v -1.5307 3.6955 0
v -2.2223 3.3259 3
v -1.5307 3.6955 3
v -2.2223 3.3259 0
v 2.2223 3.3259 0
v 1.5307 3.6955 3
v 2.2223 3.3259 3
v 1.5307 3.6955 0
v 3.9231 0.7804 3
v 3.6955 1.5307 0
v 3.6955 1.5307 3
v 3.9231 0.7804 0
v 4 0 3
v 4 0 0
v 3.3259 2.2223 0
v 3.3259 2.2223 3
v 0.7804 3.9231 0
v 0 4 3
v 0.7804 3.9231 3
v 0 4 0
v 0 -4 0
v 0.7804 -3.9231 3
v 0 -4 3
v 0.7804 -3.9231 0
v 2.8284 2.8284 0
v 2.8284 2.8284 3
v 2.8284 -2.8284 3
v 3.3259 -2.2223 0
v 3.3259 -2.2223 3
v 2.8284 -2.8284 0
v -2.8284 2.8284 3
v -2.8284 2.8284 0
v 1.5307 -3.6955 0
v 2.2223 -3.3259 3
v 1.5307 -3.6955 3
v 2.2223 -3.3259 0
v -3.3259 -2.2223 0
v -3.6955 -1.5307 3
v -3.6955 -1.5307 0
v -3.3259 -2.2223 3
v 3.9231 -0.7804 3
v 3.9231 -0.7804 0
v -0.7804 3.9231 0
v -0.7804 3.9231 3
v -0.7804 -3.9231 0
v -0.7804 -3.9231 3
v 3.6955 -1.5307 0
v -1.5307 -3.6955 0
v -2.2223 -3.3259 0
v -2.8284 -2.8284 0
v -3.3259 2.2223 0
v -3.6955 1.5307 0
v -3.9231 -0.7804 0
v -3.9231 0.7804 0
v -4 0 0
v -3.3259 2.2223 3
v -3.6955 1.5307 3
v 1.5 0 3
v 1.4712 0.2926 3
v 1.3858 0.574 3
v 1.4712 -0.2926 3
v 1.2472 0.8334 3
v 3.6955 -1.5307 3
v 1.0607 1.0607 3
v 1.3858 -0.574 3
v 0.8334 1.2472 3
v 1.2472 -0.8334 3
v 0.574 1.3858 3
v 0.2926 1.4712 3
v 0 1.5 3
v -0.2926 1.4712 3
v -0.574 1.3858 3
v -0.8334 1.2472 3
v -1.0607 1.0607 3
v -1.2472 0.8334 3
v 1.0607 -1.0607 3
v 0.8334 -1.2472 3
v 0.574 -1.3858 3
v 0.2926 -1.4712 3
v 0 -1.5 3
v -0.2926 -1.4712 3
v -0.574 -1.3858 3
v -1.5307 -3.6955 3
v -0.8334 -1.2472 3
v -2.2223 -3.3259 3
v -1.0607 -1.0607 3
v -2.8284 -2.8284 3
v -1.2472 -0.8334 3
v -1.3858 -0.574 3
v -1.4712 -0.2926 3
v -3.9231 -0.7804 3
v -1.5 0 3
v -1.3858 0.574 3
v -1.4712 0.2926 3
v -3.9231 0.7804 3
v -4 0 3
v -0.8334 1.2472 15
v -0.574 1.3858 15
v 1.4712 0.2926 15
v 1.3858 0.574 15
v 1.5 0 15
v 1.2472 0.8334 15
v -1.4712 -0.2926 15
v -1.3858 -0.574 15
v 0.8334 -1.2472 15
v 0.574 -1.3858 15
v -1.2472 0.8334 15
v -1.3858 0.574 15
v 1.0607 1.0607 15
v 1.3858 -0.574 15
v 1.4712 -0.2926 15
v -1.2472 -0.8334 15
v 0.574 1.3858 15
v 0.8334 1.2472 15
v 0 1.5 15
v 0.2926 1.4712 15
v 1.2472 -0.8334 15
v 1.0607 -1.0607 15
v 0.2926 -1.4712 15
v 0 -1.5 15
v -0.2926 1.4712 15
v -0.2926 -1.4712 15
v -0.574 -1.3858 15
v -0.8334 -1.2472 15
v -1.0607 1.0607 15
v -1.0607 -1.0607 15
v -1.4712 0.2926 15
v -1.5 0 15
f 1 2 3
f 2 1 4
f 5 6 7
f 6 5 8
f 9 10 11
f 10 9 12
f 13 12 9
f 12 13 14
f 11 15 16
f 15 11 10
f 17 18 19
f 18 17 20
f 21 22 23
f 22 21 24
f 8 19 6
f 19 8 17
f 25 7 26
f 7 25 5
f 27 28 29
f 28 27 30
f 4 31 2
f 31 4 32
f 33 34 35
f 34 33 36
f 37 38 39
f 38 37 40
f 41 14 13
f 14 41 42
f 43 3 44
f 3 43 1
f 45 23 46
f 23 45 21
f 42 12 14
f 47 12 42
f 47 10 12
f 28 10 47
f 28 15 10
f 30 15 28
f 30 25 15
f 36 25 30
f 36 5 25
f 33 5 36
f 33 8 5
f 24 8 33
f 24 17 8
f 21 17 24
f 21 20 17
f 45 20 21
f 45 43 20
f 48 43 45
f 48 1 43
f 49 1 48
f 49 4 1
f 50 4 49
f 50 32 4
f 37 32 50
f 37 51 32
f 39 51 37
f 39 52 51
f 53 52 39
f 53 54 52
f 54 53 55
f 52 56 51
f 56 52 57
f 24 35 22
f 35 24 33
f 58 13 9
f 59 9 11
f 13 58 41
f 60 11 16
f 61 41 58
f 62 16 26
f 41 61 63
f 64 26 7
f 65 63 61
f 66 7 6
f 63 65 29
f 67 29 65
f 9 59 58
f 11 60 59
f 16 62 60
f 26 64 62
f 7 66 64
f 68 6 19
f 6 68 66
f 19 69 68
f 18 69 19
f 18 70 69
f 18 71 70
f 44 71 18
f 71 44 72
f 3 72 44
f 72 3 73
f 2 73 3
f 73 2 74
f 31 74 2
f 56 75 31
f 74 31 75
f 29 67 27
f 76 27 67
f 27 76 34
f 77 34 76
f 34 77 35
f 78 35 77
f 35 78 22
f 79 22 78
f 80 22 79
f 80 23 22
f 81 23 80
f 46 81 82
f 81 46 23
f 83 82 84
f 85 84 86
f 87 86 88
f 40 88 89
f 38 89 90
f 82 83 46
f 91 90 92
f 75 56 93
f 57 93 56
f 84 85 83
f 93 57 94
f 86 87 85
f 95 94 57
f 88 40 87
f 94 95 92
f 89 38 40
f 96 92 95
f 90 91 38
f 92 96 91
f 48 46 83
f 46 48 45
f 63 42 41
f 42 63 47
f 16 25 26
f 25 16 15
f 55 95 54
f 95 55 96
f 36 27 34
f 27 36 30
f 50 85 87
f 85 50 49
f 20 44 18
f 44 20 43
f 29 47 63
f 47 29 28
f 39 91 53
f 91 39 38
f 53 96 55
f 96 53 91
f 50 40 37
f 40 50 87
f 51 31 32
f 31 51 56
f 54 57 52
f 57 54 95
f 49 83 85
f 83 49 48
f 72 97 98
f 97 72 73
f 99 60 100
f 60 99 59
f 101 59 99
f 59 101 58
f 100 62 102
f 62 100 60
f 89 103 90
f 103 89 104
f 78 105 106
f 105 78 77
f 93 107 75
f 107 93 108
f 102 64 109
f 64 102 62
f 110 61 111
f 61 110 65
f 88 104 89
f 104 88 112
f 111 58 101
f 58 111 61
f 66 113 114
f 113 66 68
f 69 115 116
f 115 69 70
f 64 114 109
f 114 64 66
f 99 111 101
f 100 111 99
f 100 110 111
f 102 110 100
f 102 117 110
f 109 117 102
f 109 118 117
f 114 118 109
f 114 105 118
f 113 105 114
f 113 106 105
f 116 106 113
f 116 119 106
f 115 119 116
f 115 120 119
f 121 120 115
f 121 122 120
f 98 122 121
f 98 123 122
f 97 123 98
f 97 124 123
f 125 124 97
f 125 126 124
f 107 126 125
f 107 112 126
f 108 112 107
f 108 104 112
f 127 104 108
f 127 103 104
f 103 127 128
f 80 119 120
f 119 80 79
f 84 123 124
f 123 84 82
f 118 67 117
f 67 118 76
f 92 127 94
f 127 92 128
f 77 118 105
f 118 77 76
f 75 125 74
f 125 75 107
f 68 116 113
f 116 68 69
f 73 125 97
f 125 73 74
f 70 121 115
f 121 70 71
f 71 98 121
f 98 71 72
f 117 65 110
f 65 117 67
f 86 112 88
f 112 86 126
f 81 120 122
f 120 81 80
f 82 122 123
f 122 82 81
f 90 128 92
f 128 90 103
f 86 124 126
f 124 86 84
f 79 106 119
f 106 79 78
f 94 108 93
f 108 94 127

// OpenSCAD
// Concept only. Provisional dimensions in mm.
$fn=32;
union(){cylinder(h=3,r=4);translate([0,0,3])cylinder(h=12,r=1.5);}
